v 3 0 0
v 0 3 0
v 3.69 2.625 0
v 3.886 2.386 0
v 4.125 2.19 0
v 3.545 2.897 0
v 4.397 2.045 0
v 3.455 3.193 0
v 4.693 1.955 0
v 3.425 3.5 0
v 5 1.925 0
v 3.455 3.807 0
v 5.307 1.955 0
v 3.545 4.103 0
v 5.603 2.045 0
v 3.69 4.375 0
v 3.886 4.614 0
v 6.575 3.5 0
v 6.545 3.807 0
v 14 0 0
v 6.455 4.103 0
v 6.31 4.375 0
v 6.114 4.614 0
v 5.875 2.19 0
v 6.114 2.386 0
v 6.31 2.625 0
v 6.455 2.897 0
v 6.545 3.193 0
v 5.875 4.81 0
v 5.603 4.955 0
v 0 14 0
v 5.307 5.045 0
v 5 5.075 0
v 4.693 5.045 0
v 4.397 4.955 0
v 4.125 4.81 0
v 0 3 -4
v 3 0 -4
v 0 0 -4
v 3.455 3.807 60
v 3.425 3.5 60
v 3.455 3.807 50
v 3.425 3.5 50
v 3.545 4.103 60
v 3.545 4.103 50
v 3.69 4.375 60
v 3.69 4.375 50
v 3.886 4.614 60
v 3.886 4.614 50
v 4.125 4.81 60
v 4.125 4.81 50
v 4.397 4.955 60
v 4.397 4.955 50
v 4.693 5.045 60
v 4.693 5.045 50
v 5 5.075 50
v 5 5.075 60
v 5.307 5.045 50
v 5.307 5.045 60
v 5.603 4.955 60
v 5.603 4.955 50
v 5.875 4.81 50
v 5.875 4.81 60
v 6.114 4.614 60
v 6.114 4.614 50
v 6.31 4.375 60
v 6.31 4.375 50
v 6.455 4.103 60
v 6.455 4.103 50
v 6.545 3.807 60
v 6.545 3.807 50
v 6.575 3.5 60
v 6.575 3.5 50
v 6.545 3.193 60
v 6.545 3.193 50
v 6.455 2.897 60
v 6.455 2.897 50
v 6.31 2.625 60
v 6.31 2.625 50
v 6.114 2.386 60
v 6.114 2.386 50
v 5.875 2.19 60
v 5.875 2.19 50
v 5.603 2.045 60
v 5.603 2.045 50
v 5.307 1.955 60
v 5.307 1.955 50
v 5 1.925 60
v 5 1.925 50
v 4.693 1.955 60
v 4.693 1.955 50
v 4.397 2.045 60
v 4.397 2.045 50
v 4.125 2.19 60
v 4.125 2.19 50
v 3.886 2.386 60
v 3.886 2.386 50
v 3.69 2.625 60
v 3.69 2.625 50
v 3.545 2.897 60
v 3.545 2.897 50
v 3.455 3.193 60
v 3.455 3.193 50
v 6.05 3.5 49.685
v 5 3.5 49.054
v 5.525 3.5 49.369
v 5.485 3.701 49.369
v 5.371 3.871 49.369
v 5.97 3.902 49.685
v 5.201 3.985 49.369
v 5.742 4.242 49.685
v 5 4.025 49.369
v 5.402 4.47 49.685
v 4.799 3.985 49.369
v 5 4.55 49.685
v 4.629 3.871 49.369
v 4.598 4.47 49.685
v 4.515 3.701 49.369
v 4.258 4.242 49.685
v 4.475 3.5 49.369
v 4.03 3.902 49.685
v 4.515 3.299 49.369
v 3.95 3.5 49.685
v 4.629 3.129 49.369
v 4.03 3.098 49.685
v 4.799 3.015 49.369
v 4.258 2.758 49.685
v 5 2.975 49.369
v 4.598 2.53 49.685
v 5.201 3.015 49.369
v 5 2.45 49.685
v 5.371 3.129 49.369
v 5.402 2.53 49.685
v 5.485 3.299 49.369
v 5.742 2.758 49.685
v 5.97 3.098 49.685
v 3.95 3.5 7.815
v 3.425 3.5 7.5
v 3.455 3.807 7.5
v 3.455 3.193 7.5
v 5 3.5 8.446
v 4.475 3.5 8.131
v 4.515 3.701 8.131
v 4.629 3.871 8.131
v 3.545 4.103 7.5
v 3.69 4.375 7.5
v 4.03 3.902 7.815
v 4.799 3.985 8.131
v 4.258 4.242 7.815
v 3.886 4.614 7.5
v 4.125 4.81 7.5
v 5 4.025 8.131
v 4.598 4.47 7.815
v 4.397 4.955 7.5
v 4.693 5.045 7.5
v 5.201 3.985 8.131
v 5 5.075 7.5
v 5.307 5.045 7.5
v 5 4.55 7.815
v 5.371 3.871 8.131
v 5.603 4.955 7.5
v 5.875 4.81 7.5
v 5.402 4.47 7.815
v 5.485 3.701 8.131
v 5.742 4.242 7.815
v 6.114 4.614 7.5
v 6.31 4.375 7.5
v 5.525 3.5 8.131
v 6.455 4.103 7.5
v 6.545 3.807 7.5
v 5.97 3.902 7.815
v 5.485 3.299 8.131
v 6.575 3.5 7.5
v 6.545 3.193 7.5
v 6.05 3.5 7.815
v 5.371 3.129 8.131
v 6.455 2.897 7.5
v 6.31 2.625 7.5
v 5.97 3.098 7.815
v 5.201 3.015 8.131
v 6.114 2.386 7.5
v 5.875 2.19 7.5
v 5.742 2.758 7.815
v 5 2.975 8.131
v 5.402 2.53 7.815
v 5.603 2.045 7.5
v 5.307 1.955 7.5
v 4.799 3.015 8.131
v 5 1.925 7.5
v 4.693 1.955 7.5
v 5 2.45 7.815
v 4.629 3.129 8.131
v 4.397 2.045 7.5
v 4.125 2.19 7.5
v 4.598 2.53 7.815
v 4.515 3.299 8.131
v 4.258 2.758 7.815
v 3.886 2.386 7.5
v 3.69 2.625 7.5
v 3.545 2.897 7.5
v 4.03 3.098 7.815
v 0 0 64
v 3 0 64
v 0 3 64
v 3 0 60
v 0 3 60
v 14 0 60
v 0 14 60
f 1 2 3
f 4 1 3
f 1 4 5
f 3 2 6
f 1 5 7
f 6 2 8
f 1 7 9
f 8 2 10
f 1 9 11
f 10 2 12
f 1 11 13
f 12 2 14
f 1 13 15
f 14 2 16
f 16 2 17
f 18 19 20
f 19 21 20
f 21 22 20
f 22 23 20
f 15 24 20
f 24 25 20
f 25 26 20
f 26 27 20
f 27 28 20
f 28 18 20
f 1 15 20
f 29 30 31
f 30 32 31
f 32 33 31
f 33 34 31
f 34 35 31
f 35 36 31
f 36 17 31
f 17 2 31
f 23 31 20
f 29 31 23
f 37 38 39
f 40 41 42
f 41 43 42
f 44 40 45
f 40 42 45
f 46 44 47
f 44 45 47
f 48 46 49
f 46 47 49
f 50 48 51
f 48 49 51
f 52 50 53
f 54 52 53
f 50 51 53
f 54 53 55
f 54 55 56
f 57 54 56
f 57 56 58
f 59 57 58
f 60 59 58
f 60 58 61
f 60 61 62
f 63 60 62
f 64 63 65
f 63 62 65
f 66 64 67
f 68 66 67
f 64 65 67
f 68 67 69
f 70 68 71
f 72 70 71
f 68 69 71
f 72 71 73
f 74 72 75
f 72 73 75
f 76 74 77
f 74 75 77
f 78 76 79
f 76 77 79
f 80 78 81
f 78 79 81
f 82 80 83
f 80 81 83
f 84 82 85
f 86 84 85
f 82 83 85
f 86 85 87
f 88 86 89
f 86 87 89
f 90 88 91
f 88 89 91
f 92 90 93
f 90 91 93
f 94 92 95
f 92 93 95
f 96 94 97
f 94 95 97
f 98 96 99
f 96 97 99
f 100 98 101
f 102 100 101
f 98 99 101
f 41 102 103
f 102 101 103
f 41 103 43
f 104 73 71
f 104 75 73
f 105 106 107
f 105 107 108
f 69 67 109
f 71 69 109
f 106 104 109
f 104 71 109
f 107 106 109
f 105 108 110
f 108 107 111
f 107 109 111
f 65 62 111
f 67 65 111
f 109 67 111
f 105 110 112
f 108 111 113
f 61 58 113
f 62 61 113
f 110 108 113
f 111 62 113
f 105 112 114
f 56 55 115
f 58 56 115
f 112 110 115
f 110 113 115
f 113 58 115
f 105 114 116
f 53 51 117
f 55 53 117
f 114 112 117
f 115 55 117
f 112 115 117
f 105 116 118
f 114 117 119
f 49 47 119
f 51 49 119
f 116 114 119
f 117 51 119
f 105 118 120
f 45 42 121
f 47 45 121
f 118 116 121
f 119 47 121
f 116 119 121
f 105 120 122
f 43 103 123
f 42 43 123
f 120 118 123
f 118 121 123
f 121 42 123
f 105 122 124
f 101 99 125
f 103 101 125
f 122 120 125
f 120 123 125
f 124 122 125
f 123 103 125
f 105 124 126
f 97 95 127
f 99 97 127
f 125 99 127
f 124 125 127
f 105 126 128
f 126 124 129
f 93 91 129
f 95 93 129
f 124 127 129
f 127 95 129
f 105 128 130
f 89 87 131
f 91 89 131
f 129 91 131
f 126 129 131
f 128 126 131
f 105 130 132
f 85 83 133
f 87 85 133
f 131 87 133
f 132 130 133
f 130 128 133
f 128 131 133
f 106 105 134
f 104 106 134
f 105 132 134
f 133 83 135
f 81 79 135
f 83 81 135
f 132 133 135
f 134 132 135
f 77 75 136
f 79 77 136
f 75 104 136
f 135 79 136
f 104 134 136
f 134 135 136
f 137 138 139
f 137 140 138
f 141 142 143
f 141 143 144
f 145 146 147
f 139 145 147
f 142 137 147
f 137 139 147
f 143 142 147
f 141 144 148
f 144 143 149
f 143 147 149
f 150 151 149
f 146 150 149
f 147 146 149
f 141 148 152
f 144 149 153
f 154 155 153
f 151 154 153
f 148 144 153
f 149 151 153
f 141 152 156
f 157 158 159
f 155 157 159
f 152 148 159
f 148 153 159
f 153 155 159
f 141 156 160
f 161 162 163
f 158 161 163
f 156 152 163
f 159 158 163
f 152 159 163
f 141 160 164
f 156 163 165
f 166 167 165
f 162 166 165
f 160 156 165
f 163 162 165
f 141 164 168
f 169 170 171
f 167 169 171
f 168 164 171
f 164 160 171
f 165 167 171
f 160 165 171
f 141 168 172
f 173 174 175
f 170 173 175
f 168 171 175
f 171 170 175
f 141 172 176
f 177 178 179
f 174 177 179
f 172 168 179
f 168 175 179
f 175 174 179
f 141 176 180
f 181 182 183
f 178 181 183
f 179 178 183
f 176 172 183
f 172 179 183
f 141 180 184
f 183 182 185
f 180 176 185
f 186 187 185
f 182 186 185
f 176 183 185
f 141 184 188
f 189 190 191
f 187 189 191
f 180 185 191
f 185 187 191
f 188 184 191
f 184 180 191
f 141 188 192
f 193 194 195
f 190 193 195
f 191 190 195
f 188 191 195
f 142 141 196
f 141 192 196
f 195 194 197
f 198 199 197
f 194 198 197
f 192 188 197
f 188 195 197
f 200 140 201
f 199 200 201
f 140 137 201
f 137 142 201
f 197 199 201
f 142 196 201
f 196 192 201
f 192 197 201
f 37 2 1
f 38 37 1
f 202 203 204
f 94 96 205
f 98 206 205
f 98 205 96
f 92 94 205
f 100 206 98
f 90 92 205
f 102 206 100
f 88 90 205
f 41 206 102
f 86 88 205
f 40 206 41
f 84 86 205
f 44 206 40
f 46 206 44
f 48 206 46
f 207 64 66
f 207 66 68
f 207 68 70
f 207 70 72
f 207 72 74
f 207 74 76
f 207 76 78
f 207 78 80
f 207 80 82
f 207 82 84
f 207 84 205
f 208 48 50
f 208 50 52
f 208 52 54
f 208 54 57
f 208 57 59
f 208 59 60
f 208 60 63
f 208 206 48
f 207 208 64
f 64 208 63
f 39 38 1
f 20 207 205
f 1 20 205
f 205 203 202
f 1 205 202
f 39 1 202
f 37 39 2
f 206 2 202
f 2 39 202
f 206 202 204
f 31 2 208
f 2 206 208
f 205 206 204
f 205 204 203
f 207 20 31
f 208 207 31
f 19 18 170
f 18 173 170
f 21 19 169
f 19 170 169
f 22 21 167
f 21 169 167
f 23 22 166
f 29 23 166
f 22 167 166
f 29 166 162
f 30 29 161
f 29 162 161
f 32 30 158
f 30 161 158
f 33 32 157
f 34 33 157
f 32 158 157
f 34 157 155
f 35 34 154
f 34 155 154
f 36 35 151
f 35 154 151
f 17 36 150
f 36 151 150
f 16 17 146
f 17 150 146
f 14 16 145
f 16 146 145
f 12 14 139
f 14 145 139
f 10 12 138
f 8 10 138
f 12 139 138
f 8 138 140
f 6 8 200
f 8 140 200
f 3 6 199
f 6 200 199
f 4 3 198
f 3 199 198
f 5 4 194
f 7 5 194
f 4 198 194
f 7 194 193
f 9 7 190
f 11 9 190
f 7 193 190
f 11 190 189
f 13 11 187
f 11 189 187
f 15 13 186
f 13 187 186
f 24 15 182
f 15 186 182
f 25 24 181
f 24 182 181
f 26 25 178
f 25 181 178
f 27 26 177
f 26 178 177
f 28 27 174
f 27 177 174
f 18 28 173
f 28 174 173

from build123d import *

# Parameters (mm, degrees)
RESSALTO_EXTRUS_O1_DEPTH                    = 60
RESSALTO_EXTRUS_O2_DEPTH                    = 4
RESSALTO_EXTRUS_O3_DEPTH                    = 4
FURO_ROSCADO_PARA_CONDU_TE_DE_M3X0_51_D     = 3.15
FURO_ROSCADO_PARA_CONDU_TE_DE_M3X0_51_DEPTH = 10
FURO_ROSCADO_PARA_CONDU_TE_DE_M3X0_51_TIP   = 0.946355475
FURO_ROSCADO_PARA_CONDU_TE_DE_M3X0_52_D     = 3.15
FURO_ROSCADO_PARA_CONDU_TE_DE_M3X0_52_DEPTH = 7.5
FURO_ROSCADO_PARA_CONDU_TE_DE_M3X0_52_TIP   = 0.946355475


with BuildPart() as part:
    # Esboço1 → Ressalto-extrusão1 (new body)
    with BuildSketch(Plane.XY):
        Polygon((0, 0), (14, 0), (0, 14), align=None)
    extrude(amount=RESSALTO_EXTRUS_O1_DEPTH)

    # Esboço2 → Ressalto-extrusão2 (add)
    with BuildSketch(Plane.XY.offset(60)):
        Polygon((0, 0), (0, 3), (3, 0), align=None)
    extrude(amount=RESSALTO_EXTRUS_O2_DEPTH)

    # Esboço3 → Ressalto-extrusão3 (add)
    with BuildSketch(Plane(origin=(0, 0, 0), x_dir=(-1, 0, 0), z_dir=(0, 0, -1))):
        Polygon((0, 0), (0, 3), (-3, 0), align=None)
    extrude(amount=RESSALTO_EXTRUS_O3_DEPTH)

    # Furo roscado para conduíte de M3x0.51
    with Locations(Plane.XY.offset(60)):
        with Locations((5, 3.5)):
            Hole(FURO_ROSCADO_PARA_CONDU_TE_DE_M3X0_51_D / 2, depth=FURO_ROSCADO_PARA_CONDU_TE_DE_M3X0_51_DEPTH)
            with Locations((0, 0, -(FURO_ROSCADO_PARA_CONDU_TE_DE_M3X0_51_DEPTH + FURO_ROSCADO_PARA_CONDU_TE_DE_M3X0_51_TIP / 2))):  # 118° drill point
                Cone(0, FURO_ROSCADO_PARA_CONDU_TE_DE_M3X0_51_D / 2, FURO_ROSCADO_PARA_CONDU_TE_DE_M3X0_51_TIP, mode=Mode.SUBTRACT)

    # Furo roscado para conduíte de M3x0.52
    with Locations(Plane(origin=(0, 0, 0), x_dir=(-1, 0, 0), z_dir=(0, 0, -1))):
        with Locations((-5, 3.5)):
            Hole(FURO_ROSCADO_PARA_CONDU_TE_DE_M3X0_52_D / 2, depth=FURO_ROSCADO_PARA_CONDU_TE_DE_M3X0_52_DEPTH)
            with Locations((0, 0, -(FURO_ROSCADO_PARA_CONDU_TE_DE_M3X0_52_DEPTH + FURO_ROSCADO_PARA_CONDU_TE_DE_M3X0_52_TIP / 2))):  # 118° drill point
                Cone(0, FURO_ROSCADO_PARA_CONDU_TE_DE_M3X0_52_D / 2, FURO_ROSCADO_PARA_CONDU_TE_DE_M3X0_52_TIP, mode=Mode.SUBTRACT)


solid = part.part
